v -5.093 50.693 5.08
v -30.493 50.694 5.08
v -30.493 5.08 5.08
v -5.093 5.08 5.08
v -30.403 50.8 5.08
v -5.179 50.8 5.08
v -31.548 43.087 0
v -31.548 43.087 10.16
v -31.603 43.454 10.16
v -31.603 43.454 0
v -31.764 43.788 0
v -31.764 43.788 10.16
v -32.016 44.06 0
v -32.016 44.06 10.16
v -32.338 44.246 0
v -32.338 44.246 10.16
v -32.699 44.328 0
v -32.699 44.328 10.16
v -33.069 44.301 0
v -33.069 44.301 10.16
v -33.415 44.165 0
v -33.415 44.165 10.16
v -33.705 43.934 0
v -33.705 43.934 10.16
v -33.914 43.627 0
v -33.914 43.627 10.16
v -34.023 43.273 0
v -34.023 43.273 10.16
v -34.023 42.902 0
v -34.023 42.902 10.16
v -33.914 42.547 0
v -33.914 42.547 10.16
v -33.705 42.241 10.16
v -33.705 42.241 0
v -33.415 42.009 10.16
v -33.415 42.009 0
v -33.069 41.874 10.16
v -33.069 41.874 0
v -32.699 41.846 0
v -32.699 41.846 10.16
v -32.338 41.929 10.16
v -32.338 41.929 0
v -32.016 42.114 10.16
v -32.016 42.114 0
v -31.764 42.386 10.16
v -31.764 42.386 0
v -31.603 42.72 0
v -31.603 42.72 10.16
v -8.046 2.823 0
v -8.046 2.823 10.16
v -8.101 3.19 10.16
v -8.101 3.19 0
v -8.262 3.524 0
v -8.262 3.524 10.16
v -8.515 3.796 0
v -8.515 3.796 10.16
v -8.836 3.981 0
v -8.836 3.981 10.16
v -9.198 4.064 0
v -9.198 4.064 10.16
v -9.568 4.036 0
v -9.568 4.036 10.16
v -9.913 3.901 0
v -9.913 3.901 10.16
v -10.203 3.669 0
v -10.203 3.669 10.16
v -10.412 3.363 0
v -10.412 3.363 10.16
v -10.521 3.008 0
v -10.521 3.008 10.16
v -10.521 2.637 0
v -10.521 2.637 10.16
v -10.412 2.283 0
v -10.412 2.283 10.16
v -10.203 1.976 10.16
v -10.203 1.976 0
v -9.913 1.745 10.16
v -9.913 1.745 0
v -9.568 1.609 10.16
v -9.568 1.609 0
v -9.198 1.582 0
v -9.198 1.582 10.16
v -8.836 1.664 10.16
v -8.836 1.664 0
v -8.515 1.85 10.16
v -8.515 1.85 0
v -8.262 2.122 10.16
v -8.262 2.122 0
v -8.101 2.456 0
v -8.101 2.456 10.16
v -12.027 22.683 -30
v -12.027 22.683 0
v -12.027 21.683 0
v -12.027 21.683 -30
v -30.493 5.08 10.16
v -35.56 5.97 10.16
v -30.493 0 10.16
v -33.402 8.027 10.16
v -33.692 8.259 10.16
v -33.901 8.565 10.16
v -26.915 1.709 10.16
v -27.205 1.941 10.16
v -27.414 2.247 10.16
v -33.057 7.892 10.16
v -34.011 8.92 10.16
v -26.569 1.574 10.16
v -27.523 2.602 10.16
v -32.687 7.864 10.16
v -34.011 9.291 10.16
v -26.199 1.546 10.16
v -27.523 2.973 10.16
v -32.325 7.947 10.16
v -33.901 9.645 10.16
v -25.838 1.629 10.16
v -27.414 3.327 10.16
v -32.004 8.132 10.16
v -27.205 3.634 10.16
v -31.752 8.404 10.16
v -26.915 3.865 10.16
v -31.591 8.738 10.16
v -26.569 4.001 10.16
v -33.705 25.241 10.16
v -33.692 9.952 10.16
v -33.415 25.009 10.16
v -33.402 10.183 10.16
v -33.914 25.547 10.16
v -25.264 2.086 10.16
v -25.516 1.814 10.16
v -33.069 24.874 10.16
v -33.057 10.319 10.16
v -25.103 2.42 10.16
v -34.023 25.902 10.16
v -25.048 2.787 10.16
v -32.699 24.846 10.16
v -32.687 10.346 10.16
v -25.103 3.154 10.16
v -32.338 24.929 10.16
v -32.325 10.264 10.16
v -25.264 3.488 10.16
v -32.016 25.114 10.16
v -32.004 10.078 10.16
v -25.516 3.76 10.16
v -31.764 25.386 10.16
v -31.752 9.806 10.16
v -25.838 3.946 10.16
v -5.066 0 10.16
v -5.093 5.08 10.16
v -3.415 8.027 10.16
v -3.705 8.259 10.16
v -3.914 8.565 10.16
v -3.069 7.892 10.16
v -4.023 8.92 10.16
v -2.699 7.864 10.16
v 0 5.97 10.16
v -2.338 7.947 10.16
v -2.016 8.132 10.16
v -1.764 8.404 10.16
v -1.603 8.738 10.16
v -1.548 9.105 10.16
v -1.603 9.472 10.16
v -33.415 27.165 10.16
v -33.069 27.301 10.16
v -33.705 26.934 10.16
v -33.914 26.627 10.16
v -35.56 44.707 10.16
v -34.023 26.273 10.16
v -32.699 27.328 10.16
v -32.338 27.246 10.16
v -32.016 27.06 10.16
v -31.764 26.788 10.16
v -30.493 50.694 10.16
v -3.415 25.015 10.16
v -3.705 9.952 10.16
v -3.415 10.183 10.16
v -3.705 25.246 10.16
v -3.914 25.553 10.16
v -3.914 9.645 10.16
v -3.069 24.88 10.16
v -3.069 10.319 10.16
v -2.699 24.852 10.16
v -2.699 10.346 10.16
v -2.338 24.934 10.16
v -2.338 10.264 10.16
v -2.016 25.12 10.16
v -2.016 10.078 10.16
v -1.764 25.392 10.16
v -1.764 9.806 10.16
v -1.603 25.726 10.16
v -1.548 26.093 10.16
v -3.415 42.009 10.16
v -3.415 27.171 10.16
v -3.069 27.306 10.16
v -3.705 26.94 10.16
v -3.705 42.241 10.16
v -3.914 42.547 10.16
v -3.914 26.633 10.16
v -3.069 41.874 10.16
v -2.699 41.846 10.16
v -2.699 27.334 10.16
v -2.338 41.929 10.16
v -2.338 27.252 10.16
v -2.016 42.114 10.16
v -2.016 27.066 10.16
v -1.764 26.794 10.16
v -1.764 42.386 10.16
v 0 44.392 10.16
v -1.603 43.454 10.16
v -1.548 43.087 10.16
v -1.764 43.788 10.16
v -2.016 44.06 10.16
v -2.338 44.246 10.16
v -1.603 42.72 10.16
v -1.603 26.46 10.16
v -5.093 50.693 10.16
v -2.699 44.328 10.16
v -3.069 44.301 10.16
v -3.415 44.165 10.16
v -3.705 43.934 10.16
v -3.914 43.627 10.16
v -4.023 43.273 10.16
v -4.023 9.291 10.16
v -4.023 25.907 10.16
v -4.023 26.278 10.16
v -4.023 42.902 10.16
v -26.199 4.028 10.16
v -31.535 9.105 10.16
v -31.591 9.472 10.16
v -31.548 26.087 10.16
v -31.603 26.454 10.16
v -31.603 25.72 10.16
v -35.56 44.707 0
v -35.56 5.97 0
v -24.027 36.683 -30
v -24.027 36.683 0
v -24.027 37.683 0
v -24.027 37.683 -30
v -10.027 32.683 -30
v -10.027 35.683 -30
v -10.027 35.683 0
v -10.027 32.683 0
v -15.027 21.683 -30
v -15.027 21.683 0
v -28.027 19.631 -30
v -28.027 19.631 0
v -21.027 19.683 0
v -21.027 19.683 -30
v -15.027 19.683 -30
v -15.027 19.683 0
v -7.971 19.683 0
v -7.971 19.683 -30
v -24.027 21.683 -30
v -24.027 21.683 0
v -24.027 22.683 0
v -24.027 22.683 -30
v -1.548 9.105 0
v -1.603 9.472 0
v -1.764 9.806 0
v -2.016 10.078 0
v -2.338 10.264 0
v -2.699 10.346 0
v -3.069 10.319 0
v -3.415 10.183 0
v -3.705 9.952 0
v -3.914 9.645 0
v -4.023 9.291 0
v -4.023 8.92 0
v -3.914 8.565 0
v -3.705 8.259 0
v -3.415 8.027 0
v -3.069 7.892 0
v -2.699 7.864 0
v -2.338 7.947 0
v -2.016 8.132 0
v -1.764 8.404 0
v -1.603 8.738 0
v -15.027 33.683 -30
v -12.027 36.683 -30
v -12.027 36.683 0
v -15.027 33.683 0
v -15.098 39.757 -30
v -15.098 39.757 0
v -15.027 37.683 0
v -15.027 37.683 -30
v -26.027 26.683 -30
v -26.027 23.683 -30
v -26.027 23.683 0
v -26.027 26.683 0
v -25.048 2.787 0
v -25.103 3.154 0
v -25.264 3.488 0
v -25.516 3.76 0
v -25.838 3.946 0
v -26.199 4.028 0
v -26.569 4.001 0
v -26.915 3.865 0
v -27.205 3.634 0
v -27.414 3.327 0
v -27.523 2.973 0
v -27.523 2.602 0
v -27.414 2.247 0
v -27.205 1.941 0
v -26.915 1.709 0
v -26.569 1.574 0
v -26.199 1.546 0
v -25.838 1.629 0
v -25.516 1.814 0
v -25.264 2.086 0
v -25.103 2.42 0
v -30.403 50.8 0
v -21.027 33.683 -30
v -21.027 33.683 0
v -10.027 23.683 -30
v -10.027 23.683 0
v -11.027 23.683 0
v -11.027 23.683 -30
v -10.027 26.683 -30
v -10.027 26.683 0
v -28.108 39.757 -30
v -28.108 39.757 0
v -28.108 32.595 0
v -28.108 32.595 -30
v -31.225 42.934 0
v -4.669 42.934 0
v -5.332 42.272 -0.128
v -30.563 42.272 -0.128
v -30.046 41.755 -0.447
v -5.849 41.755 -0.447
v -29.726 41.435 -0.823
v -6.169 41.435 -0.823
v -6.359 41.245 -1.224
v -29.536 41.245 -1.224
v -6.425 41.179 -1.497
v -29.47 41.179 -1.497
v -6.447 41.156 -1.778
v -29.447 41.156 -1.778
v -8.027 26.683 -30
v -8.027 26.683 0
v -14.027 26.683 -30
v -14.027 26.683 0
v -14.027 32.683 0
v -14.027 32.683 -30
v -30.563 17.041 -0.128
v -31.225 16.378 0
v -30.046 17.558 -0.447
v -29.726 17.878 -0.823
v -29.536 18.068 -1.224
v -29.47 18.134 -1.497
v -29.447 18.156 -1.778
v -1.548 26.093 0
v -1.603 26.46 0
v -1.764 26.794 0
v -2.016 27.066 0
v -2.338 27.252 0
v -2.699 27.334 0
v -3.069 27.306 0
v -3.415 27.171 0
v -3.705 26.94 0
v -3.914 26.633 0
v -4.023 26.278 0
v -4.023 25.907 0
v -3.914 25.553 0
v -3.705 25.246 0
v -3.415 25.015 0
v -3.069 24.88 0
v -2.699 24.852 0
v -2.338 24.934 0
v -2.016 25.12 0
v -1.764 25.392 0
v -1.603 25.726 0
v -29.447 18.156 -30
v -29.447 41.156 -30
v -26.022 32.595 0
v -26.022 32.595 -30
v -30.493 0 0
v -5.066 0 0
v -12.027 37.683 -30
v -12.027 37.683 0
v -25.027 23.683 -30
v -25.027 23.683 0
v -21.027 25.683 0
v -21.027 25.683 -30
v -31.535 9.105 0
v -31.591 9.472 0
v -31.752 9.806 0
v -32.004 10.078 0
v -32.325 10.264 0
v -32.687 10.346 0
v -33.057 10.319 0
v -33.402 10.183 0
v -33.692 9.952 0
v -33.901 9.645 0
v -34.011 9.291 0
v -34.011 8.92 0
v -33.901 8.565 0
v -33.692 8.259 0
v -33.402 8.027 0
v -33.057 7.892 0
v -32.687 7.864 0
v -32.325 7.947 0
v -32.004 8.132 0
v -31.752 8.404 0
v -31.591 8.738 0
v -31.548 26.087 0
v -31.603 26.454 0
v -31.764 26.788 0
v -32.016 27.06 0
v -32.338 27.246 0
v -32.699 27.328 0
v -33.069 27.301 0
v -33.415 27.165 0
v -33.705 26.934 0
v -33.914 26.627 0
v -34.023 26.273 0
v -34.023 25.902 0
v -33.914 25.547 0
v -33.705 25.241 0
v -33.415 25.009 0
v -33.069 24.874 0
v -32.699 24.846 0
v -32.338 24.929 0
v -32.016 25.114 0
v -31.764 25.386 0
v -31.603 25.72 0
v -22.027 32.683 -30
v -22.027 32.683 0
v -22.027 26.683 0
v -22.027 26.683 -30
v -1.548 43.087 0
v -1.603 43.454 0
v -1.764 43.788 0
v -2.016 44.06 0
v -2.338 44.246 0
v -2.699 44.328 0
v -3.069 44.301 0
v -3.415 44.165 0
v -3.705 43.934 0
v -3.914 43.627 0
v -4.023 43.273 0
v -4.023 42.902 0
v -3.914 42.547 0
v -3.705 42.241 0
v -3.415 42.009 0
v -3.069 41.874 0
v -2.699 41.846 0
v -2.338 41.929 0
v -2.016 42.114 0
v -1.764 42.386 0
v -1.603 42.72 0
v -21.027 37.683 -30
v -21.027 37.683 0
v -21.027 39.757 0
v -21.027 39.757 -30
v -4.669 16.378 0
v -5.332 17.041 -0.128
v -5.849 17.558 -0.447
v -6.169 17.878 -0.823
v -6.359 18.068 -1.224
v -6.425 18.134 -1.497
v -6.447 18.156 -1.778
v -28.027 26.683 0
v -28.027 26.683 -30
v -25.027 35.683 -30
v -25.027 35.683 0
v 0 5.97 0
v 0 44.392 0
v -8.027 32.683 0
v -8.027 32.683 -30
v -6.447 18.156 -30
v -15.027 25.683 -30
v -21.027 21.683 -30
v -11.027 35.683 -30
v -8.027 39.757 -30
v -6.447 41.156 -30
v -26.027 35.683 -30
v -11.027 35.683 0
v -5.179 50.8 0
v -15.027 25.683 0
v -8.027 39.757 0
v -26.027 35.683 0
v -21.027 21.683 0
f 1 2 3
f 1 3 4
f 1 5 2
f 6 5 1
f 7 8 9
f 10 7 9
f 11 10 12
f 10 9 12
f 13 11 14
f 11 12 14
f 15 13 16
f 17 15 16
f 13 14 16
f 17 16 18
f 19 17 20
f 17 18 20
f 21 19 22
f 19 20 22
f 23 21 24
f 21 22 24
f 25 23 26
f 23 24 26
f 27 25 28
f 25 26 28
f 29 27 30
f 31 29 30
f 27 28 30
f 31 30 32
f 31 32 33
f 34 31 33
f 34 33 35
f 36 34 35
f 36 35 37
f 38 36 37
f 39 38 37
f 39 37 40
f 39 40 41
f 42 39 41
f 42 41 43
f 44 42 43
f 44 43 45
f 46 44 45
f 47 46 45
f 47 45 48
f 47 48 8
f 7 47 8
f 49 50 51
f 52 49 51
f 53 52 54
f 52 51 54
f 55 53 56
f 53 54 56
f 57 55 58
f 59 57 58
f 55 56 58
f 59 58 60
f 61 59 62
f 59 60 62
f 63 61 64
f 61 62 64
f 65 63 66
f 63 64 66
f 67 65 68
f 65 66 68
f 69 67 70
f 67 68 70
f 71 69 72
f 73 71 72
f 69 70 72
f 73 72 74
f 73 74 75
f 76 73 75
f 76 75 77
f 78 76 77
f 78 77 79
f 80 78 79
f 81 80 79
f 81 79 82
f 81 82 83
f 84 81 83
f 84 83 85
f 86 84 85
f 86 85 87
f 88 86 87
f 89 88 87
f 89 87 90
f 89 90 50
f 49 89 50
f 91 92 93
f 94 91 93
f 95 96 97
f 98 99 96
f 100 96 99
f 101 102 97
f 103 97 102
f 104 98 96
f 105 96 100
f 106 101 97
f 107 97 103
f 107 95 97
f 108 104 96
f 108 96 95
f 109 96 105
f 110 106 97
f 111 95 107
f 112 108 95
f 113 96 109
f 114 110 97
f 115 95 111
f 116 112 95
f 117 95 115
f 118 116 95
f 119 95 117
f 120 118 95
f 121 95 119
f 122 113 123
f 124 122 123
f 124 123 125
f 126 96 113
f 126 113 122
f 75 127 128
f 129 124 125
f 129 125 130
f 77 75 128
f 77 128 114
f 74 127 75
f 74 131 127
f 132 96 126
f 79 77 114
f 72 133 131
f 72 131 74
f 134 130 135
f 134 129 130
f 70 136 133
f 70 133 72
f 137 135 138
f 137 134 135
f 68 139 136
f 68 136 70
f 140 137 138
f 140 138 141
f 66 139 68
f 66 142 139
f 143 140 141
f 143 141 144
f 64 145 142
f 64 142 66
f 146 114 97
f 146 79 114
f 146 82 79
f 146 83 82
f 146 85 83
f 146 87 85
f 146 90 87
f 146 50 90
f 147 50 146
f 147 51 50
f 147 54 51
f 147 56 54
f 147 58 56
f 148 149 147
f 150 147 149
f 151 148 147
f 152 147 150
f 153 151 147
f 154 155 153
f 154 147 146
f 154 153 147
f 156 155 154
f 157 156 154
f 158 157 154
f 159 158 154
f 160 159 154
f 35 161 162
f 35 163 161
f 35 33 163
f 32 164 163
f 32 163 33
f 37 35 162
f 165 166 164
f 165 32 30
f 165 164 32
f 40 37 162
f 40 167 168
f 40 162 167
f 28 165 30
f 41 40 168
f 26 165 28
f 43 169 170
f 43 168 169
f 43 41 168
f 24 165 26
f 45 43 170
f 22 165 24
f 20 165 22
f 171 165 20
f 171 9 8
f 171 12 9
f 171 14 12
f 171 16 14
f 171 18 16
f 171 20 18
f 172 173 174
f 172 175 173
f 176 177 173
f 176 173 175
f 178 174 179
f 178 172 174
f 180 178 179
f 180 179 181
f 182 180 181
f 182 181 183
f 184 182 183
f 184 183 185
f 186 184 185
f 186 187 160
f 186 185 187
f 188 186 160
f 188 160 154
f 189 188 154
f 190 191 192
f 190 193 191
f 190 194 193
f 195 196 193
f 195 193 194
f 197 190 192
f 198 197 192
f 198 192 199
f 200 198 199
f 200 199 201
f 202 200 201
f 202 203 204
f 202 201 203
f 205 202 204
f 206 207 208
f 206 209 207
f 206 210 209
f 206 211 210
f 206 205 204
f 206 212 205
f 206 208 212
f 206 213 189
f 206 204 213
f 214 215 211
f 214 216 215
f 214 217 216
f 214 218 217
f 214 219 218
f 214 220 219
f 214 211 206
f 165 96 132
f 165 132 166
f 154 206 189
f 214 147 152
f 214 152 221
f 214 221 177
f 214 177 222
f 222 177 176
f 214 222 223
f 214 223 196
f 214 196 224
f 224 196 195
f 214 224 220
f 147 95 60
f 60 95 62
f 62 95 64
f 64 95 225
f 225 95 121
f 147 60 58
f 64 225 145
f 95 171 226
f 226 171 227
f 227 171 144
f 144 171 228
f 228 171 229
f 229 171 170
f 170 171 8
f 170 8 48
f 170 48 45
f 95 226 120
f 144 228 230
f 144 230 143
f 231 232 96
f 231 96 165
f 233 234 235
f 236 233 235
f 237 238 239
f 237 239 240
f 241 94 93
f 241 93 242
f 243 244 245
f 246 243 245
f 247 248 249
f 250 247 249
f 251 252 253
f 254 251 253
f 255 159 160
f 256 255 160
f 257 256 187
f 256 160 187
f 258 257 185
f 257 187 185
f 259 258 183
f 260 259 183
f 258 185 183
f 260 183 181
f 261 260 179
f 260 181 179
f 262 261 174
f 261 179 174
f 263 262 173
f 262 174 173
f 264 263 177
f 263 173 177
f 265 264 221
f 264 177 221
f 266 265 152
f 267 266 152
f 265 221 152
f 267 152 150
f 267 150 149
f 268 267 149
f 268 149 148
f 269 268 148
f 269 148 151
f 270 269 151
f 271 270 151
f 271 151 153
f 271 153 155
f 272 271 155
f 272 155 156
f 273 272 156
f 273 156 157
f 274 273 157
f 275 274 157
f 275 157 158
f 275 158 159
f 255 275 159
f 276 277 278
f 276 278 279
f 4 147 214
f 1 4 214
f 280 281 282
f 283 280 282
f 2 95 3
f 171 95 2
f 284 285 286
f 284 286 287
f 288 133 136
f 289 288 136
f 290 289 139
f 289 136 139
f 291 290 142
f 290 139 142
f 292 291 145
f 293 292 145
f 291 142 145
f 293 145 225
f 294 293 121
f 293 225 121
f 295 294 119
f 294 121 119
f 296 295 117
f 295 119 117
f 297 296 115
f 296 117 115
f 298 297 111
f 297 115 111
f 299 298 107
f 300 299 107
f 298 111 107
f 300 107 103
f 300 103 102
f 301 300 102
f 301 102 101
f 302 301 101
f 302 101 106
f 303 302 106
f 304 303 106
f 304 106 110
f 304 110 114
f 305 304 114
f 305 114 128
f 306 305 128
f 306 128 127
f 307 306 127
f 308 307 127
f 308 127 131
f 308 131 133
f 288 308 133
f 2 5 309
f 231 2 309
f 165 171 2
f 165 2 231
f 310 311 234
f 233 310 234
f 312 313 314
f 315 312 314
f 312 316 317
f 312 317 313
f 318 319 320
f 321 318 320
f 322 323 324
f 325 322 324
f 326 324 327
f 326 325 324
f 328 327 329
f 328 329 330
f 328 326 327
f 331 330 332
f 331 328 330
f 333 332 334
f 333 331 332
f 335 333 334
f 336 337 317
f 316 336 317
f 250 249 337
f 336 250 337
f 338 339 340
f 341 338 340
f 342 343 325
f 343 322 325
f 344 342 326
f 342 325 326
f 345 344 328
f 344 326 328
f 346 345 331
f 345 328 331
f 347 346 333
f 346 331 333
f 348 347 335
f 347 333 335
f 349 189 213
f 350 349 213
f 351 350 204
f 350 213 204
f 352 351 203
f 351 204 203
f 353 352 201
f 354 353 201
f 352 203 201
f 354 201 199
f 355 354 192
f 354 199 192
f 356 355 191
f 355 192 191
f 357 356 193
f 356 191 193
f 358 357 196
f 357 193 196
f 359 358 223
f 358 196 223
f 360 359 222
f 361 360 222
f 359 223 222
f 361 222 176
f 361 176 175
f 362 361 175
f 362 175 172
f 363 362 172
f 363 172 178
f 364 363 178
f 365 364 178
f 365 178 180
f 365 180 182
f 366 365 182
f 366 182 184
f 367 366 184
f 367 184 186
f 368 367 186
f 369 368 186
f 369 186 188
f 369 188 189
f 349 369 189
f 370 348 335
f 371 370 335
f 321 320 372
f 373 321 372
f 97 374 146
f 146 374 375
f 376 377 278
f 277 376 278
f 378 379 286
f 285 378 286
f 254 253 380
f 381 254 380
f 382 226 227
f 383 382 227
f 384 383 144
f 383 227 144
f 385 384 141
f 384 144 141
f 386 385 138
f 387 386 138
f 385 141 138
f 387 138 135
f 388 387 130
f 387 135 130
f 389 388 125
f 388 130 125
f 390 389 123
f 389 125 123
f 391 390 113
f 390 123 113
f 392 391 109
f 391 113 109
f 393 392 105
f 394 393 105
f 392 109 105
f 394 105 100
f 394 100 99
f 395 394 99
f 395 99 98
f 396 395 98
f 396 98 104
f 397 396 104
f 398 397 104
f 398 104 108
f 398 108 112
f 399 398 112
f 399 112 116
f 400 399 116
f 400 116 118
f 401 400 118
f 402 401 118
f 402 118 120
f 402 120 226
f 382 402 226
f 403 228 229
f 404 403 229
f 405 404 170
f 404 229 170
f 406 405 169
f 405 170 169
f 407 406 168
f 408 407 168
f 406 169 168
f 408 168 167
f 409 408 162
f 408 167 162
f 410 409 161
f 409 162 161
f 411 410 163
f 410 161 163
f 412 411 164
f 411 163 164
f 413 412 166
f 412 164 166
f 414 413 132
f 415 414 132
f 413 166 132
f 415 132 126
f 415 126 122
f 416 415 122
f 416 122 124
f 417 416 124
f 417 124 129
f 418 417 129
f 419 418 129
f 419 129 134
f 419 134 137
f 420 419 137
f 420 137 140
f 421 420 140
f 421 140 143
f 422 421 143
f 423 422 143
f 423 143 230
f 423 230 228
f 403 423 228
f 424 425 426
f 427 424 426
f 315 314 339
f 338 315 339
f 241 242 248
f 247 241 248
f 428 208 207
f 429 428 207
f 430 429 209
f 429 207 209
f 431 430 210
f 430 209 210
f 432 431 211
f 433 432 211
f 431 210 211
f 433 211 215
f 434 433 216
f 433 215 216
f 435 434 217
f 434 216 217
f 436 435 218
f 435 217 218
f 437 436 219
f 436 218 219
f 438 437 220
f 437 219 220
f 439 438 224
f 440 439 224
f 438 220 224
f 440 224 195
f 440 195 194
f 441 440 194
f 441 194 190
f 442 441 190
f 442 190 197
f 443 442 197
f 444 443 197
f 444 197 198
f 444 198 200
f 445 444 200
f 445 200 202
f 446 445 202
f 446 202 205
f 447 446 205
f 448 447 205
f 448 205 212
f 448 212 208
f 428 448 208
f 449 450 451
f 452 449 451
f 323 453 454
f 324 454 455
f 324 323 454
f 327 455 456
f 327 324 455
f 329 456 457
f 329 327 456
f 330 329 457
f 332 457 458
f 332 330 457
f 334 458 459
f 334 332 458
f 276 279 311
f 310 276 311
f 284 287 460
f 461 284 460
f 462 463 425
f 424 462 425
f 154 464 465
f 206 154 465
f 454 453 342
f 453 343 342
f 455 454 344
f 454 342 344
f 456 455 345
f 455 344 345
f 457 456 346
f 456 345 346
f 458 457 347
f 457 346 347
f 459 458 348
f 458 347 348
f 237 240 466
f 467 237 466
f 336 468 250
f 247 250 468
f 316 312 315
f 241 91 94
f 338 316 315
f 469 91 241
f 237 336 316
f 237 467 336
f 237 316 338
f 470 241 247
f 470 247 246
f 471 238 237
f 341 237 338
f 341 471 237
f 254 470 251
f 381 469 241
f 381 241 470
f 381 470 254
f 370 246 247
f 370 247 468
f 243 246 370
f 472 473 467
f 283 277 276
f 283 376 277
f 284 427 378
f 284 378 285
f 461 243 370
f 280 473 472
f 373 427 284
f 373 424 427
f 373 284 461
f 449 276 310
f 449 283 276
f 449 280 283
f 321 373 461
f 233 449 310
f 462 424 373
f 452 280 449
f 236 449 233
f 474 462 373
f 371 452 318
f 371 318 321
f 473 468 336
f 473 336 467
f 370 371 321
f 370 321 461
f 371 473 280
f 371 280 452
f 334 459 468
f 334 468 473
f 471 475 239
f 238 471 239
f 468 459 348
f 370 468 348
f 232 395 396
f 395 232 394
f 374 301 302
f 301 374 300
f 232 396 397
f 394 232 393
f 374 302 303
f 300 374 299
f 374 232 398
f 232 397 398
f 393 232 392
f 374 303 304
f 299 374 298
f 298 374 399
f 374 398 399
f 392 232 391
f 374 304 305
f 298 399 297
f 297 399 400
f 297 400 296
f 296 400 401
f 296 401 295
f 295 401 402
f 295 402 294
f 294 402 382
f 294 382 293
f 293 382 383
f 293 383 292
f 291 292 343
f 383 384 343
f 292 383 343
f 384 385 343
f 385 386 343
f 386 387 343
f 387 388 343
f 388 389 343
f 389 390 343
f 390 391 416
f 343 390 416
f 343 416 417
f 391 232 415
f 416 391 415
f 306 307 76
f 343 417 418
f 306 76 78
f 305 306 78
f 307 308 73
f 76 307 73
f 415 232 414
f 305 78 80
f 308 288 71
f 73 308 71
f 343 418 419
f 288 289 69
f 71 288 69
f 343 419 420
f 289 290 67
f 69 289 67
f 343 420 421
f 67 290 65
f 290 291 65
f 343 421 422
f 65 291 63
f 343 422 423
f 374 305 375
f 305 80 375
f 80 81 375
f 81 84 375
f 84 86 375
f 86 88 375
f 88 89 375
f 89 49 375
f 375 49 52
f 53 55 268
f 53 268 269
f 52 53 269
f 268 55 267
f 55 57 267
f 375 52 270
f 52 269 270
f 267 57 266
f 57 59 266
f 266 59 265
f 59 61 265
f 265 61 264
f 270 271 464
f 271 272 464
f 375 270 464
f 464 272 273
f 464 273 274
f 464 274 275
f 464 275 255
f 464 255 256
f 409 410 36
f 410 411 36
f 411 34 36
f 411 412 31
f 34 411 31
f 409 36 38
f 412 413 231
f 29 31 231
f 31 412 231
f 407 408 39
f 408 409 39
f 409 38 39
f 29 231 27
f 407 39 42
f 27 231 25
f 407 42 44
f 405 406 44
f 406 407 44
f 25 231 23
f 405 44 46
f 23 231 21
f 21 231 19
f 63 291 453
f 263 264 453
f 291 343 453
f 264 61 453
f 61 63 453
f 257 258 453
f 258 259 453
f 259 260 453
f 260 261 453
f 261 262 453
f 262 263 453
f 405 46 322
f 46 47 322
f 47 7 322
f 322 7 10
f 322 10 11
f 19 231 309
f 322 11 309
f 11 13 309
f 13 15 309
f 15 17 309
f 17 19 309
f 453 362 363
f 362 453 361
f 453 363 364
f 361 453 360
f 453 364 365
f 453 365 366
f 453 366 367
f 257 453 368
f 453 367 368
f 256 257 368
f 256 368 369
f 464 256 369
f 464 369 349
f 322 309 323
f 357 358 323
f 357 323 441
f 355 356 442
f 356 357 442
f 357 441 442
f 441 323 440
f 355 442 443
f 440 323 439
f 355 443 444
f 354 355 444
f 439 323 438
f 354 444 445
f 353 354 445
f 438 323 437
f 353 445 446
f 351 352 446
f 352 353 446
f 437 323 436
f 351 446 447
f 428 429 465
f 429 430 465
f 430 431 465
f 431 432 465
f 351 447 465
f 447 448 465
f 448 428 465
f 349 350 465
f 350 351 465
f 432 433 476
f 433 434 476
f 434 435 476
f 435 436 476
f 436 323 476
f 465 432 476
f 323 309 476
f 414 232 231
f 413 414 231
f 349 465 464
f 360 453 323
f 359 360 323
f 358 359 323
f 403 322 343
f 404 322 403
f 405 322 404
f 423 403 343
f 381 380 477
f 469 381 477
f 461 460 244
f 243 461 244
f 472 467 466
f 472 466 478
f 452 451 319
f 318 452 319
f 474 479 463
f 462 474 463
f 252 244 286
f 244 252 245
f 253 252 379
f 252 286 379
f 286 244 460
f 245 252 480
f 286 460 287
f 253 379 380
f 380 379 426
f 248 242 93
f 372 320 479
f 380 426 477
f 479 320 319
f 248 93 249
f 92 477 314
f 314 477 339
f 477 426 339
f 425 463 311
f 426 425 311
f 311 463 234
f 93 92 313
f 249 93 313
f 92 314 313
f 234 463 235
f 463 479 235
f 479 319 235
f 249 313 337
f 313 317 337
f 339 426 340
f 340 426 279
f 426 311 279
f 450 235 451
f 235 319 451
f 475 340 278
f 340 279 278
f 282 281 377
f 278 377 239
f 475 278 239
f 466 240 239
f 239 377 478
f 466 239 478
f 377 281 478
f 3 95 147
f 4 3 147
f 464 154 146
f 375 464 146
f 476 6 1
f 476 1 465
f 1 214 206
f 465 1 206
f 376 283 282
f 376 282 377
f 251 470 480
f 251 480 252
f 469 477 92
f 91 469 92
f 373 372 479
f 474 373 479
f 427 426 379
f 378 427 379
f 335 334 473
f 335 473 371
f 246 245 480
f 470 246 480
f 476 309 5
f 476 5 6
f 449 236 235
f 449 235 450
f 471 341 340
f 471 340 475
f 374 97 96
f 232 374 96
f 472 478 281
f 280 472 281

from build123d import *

# Parameters (mm, degrees)
SKETCH1_W                   = 35.56
SKETCH1_H                   = 50.8
BOSS_EXTRUDE1_DEPTH         = 10.16
SKETCH2_W                   = 25.4
SKETCH2_H                   = 45.72
CUT_EXTRUDE2_DEPTH          = 5.08
F_40_0_098_DIAMETER_HOLE1_D = 2.4892
SKETCH7_W                   = 23
SKETCH7_H                   = 23
BOSS_EXTRUDE2_DEPTH         = 30
FILLET1_R                   = 1.778
CUT_EXTRUDE3_DEPTH          = 74.878137497


with BuildPart() as part:
    # Sketch1 → Boss-Extrude1 (new body)
    with BuildSketch(Plane.XY):
        with Locations((-17.78, 25.4)):
            Rectangle(SKETCH1_W, SKETCH1_H)
    extrude(amount=BOSS_EXTRUDE1_DEPTH)

    # Sketch2 → Cut-Extrude2 (cut)
    with BuildSketch(Plane.XY.offset(10.16)):
        with Locations((-17.792594088, 27.94)):
            Rectangle(SKETCH2_W, SKETCH2_H)
    extrude(amount=-CUT_EXTRUDE2_DEPTH, mode=Mode.SUBTRACT)

    # #40 (0.098) Diameter Hole1 (through all)
    with Locations(Plane(origin=(0, 0, 0), x_dir=(-1, 0, 0), z_dir=(0, 0, -1))):
        with Locations((2.792369004, 43.087106138), (2.792369004, 26.092979092), (2.792369004, 9.105182099), (9.290740849, 2.822744672), (26.292369004, 2.787106138), (32.780032006, 9.105182099), (32.792369004, 26.087106138), (32.792369004, 43.087106138)):
            Hole(F_40_0_098_DIAMETER_HOLE1_D / 2)

    # Sketch7 → Boss-Extrude2 (add)
    with BuildSketch(Plane(origin=(0, 0, 0), x_dir=(-1, 0, 0), z_dir=(0, 0, -1))):
        with Locations((17.947498481, 29.656487967)):
            Rectangle(SKETCH7_W, SKETCH7_H)
        Polygon((15.026504795, 33.68344643), (21.026504795, 33.68344643), (24.026504795, 36.68344643), (24.026504795, 37.68344643), (21.026504795, 37.68344643), (21.026504795, 39.757316979), (28.107693687, 39.757316979), (28.107693687, 32.595354636), (26.021869747, 32.595354636), (26.026504795, 35.68344643), (25.026504795, 35.68344643), (22.026504795, 32.68344643), (22.026504795, 26.68344643), (25.026504795, 23.68344643), (26.026504795, 23.68344643), (26.026504795, 26.68344643), (28.026504795, 26.68344643), (28.026504795, 19.631136525), (21.026504795, 19.68344643), (21.026504795, 21.68344643), (24.026504795, 21.68344643), (24.026504795, 22.68344643), (21.026504795, 25.68344643), (15.026504795, 25.68344643), (12.026504795, 22.68344643), (12.026504795, 21.68344643), (15.026504795, 21.68344643), (15.026504795, 19.68344643), (7.971438759, 19.68344643), (8.026504795, 26.68344643), (10.026504795, 26.68344643), (10.026504795, 23.68344643), (11.026504795, 23.68344643), (14.026504795, 26.68344643), (14.026504795, 32.68344643), (11.026504795, 35.68344643), (10.026504795, 35.68344643), (10.026504795, 32.68344643), (8.026504795, 32.68344643), (8.026504795, 39.757316979), (15.097897728, 39.757316979), (15.026504795, 37.68344643), (12.026504795, 37.68344643), (12.026504795, 36.68344643), align=None, mode=Mode.SUBTRACT)
    extrude(amount=BOSS_EXTRUDE2_DEPTH)

    # Fillet1
    fillet1_edges = [part.edges().sort_by_distance(p)[0] for p in [
        (-6.447498481, 29.656487967, 0),
        (-17.947498481, 18.156487967, 0),
        (-29.447498481, 29.656487967, 0),
        (-17.947498481, 41.156487967, 0),
    ]]
    fillet(fillet1_edges, radius=FILLET1_R)

    # Sketch8 → Cut-Extrude3 (cut, through all)
    with BuildSketch(Plane.XY.offset(10.16)):
        Polygon((-5.178964387, 50.8), (0, 44.392134486), (0, 50.8), align=None)
        Polygon((-35.56, 44.706622517), (-35.56, 50.8), (-30.402645731, 50.8), align=None)
        Polygon((-35.56, 5.970049098), (-35.56, 0), (-30.492594088, 0), align=None)
        Polygon((-5.092594088, -0.031324356), (0, 0), (0, 5.970049098), align=None)
    extrude(amount=-CUT_EXTRUDE3_DEPTH, mode=Mode.SUBTRACT)


solid = part.part
